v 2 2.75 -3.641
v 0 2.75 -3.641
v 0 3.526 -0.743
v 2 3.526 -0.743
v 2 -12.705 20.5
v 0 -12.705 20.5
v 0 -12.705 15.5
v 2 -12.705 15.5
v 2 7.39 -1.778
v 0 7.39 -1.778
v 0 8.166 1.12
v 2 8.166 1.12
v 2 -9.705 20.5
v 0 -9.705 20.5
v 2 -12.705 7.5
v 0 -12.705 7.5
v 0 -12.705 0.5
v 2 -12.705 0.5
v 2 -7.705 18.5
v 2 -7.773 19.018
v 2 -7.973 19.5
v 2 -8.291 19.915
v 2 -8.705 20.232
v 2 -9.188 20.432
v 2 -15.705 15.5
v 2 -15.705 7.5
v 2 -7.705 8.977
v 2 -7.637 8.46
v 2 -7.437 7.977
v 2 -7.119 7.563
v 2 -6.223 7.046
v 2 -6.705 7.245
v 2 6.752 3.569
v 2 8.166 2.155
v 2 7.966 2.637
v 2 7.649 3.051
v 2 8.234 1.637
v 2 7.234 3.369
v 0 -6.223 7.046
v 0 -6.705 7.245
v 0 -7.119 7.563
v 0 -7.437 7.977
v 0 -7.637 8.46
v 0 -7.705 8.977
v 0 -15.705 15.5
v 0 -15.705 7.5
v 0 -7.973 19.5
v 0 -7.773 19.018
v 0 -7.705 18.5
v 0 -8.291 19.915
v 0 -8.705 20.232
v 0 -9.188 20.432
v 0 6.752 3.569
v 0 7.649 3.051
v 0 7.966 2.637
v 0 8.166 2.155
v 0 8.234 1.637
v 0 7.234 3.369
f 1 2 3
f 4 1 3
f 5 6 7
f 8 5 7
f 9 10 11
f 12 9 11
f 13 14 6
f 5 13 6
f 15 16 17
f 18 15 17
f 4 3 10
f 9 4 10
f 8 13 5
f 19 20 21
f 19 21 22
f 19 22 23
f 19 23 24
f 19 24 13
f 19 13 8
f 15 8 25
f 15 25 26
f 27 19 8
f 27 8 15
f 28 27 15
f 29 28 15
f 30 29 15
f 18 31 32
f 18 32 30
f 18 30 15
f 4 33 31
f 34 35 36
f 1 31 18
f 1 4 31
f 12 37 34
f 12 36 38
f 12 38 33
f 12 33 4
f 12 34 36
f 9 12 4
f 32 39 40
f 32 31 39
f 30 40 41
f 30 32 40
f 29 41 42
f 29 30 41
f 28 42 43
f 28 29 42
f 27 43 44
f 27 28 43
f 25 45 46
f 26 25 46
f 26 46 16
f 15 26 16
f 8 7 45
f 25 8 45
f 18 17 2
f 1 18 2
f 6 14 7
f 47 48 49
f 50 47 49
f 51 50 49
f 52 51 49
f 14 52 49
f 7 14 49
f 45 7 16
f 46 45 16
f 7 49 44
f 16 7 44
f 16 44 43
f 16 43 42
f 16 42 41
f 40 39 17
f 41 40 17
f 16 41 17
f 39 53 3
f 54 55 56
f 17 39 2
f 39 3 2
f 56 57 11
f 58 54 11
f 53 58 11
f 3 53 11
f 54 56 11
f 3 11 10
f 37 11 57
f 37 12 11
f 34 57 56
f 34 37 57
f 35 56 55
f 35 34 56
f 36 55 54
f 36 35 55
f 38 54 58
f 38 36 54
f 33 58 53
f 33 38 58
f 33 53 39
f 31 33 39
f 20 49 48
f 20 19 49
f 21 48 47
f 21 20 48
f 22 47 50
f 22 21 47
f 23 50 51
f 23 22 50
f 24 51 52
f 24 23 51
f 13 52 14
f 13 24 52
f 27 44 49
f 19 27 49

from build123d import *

# Parameters (mm, degrees)
BOSS_EXTRU_1_DEPTH = 2
CONG_1_R           = 2


with BuildPart() as part:
    # Esquisse1 → Boss.-Extru.1 (new body)
    with BuildSketch(Plane(origin=(0, 0, 0), x_dir=(0, 0, -1), z_dir=(1, 0, 0))):
        Polygon((-20.500365221, -12.705219678), (-15.500365221, -12.705219678), (-15.500365221, -15.705219678), (-7.500365221, -15.705219678), (-7.500365221, -12.705219678), (-0.500365221, -12.705219678), (3.6407395, 2.749593542), (0.742962022, 3.526050678), (1.778238202, 7.389753983), (-3.051390929, 8.683849208), (-7.442828702, -7.705219678), (-20.500365221, -7.705219678), align=None)
    extrude(amount=BOSS_EXTRU_1_DEPTH)

    # Congé1
    cong_1_edges = [part.edges().sort_by_distance(p)[0] for p in [
        (1, -7.705219678, 20.500365221),
        (1, -7.705219678, 7.442828702),
        (1, 8.683849208, 3.051390929),
    ]]
    fillet(cong_1_edges, radius=CONG_1_R)


solid = part.part
